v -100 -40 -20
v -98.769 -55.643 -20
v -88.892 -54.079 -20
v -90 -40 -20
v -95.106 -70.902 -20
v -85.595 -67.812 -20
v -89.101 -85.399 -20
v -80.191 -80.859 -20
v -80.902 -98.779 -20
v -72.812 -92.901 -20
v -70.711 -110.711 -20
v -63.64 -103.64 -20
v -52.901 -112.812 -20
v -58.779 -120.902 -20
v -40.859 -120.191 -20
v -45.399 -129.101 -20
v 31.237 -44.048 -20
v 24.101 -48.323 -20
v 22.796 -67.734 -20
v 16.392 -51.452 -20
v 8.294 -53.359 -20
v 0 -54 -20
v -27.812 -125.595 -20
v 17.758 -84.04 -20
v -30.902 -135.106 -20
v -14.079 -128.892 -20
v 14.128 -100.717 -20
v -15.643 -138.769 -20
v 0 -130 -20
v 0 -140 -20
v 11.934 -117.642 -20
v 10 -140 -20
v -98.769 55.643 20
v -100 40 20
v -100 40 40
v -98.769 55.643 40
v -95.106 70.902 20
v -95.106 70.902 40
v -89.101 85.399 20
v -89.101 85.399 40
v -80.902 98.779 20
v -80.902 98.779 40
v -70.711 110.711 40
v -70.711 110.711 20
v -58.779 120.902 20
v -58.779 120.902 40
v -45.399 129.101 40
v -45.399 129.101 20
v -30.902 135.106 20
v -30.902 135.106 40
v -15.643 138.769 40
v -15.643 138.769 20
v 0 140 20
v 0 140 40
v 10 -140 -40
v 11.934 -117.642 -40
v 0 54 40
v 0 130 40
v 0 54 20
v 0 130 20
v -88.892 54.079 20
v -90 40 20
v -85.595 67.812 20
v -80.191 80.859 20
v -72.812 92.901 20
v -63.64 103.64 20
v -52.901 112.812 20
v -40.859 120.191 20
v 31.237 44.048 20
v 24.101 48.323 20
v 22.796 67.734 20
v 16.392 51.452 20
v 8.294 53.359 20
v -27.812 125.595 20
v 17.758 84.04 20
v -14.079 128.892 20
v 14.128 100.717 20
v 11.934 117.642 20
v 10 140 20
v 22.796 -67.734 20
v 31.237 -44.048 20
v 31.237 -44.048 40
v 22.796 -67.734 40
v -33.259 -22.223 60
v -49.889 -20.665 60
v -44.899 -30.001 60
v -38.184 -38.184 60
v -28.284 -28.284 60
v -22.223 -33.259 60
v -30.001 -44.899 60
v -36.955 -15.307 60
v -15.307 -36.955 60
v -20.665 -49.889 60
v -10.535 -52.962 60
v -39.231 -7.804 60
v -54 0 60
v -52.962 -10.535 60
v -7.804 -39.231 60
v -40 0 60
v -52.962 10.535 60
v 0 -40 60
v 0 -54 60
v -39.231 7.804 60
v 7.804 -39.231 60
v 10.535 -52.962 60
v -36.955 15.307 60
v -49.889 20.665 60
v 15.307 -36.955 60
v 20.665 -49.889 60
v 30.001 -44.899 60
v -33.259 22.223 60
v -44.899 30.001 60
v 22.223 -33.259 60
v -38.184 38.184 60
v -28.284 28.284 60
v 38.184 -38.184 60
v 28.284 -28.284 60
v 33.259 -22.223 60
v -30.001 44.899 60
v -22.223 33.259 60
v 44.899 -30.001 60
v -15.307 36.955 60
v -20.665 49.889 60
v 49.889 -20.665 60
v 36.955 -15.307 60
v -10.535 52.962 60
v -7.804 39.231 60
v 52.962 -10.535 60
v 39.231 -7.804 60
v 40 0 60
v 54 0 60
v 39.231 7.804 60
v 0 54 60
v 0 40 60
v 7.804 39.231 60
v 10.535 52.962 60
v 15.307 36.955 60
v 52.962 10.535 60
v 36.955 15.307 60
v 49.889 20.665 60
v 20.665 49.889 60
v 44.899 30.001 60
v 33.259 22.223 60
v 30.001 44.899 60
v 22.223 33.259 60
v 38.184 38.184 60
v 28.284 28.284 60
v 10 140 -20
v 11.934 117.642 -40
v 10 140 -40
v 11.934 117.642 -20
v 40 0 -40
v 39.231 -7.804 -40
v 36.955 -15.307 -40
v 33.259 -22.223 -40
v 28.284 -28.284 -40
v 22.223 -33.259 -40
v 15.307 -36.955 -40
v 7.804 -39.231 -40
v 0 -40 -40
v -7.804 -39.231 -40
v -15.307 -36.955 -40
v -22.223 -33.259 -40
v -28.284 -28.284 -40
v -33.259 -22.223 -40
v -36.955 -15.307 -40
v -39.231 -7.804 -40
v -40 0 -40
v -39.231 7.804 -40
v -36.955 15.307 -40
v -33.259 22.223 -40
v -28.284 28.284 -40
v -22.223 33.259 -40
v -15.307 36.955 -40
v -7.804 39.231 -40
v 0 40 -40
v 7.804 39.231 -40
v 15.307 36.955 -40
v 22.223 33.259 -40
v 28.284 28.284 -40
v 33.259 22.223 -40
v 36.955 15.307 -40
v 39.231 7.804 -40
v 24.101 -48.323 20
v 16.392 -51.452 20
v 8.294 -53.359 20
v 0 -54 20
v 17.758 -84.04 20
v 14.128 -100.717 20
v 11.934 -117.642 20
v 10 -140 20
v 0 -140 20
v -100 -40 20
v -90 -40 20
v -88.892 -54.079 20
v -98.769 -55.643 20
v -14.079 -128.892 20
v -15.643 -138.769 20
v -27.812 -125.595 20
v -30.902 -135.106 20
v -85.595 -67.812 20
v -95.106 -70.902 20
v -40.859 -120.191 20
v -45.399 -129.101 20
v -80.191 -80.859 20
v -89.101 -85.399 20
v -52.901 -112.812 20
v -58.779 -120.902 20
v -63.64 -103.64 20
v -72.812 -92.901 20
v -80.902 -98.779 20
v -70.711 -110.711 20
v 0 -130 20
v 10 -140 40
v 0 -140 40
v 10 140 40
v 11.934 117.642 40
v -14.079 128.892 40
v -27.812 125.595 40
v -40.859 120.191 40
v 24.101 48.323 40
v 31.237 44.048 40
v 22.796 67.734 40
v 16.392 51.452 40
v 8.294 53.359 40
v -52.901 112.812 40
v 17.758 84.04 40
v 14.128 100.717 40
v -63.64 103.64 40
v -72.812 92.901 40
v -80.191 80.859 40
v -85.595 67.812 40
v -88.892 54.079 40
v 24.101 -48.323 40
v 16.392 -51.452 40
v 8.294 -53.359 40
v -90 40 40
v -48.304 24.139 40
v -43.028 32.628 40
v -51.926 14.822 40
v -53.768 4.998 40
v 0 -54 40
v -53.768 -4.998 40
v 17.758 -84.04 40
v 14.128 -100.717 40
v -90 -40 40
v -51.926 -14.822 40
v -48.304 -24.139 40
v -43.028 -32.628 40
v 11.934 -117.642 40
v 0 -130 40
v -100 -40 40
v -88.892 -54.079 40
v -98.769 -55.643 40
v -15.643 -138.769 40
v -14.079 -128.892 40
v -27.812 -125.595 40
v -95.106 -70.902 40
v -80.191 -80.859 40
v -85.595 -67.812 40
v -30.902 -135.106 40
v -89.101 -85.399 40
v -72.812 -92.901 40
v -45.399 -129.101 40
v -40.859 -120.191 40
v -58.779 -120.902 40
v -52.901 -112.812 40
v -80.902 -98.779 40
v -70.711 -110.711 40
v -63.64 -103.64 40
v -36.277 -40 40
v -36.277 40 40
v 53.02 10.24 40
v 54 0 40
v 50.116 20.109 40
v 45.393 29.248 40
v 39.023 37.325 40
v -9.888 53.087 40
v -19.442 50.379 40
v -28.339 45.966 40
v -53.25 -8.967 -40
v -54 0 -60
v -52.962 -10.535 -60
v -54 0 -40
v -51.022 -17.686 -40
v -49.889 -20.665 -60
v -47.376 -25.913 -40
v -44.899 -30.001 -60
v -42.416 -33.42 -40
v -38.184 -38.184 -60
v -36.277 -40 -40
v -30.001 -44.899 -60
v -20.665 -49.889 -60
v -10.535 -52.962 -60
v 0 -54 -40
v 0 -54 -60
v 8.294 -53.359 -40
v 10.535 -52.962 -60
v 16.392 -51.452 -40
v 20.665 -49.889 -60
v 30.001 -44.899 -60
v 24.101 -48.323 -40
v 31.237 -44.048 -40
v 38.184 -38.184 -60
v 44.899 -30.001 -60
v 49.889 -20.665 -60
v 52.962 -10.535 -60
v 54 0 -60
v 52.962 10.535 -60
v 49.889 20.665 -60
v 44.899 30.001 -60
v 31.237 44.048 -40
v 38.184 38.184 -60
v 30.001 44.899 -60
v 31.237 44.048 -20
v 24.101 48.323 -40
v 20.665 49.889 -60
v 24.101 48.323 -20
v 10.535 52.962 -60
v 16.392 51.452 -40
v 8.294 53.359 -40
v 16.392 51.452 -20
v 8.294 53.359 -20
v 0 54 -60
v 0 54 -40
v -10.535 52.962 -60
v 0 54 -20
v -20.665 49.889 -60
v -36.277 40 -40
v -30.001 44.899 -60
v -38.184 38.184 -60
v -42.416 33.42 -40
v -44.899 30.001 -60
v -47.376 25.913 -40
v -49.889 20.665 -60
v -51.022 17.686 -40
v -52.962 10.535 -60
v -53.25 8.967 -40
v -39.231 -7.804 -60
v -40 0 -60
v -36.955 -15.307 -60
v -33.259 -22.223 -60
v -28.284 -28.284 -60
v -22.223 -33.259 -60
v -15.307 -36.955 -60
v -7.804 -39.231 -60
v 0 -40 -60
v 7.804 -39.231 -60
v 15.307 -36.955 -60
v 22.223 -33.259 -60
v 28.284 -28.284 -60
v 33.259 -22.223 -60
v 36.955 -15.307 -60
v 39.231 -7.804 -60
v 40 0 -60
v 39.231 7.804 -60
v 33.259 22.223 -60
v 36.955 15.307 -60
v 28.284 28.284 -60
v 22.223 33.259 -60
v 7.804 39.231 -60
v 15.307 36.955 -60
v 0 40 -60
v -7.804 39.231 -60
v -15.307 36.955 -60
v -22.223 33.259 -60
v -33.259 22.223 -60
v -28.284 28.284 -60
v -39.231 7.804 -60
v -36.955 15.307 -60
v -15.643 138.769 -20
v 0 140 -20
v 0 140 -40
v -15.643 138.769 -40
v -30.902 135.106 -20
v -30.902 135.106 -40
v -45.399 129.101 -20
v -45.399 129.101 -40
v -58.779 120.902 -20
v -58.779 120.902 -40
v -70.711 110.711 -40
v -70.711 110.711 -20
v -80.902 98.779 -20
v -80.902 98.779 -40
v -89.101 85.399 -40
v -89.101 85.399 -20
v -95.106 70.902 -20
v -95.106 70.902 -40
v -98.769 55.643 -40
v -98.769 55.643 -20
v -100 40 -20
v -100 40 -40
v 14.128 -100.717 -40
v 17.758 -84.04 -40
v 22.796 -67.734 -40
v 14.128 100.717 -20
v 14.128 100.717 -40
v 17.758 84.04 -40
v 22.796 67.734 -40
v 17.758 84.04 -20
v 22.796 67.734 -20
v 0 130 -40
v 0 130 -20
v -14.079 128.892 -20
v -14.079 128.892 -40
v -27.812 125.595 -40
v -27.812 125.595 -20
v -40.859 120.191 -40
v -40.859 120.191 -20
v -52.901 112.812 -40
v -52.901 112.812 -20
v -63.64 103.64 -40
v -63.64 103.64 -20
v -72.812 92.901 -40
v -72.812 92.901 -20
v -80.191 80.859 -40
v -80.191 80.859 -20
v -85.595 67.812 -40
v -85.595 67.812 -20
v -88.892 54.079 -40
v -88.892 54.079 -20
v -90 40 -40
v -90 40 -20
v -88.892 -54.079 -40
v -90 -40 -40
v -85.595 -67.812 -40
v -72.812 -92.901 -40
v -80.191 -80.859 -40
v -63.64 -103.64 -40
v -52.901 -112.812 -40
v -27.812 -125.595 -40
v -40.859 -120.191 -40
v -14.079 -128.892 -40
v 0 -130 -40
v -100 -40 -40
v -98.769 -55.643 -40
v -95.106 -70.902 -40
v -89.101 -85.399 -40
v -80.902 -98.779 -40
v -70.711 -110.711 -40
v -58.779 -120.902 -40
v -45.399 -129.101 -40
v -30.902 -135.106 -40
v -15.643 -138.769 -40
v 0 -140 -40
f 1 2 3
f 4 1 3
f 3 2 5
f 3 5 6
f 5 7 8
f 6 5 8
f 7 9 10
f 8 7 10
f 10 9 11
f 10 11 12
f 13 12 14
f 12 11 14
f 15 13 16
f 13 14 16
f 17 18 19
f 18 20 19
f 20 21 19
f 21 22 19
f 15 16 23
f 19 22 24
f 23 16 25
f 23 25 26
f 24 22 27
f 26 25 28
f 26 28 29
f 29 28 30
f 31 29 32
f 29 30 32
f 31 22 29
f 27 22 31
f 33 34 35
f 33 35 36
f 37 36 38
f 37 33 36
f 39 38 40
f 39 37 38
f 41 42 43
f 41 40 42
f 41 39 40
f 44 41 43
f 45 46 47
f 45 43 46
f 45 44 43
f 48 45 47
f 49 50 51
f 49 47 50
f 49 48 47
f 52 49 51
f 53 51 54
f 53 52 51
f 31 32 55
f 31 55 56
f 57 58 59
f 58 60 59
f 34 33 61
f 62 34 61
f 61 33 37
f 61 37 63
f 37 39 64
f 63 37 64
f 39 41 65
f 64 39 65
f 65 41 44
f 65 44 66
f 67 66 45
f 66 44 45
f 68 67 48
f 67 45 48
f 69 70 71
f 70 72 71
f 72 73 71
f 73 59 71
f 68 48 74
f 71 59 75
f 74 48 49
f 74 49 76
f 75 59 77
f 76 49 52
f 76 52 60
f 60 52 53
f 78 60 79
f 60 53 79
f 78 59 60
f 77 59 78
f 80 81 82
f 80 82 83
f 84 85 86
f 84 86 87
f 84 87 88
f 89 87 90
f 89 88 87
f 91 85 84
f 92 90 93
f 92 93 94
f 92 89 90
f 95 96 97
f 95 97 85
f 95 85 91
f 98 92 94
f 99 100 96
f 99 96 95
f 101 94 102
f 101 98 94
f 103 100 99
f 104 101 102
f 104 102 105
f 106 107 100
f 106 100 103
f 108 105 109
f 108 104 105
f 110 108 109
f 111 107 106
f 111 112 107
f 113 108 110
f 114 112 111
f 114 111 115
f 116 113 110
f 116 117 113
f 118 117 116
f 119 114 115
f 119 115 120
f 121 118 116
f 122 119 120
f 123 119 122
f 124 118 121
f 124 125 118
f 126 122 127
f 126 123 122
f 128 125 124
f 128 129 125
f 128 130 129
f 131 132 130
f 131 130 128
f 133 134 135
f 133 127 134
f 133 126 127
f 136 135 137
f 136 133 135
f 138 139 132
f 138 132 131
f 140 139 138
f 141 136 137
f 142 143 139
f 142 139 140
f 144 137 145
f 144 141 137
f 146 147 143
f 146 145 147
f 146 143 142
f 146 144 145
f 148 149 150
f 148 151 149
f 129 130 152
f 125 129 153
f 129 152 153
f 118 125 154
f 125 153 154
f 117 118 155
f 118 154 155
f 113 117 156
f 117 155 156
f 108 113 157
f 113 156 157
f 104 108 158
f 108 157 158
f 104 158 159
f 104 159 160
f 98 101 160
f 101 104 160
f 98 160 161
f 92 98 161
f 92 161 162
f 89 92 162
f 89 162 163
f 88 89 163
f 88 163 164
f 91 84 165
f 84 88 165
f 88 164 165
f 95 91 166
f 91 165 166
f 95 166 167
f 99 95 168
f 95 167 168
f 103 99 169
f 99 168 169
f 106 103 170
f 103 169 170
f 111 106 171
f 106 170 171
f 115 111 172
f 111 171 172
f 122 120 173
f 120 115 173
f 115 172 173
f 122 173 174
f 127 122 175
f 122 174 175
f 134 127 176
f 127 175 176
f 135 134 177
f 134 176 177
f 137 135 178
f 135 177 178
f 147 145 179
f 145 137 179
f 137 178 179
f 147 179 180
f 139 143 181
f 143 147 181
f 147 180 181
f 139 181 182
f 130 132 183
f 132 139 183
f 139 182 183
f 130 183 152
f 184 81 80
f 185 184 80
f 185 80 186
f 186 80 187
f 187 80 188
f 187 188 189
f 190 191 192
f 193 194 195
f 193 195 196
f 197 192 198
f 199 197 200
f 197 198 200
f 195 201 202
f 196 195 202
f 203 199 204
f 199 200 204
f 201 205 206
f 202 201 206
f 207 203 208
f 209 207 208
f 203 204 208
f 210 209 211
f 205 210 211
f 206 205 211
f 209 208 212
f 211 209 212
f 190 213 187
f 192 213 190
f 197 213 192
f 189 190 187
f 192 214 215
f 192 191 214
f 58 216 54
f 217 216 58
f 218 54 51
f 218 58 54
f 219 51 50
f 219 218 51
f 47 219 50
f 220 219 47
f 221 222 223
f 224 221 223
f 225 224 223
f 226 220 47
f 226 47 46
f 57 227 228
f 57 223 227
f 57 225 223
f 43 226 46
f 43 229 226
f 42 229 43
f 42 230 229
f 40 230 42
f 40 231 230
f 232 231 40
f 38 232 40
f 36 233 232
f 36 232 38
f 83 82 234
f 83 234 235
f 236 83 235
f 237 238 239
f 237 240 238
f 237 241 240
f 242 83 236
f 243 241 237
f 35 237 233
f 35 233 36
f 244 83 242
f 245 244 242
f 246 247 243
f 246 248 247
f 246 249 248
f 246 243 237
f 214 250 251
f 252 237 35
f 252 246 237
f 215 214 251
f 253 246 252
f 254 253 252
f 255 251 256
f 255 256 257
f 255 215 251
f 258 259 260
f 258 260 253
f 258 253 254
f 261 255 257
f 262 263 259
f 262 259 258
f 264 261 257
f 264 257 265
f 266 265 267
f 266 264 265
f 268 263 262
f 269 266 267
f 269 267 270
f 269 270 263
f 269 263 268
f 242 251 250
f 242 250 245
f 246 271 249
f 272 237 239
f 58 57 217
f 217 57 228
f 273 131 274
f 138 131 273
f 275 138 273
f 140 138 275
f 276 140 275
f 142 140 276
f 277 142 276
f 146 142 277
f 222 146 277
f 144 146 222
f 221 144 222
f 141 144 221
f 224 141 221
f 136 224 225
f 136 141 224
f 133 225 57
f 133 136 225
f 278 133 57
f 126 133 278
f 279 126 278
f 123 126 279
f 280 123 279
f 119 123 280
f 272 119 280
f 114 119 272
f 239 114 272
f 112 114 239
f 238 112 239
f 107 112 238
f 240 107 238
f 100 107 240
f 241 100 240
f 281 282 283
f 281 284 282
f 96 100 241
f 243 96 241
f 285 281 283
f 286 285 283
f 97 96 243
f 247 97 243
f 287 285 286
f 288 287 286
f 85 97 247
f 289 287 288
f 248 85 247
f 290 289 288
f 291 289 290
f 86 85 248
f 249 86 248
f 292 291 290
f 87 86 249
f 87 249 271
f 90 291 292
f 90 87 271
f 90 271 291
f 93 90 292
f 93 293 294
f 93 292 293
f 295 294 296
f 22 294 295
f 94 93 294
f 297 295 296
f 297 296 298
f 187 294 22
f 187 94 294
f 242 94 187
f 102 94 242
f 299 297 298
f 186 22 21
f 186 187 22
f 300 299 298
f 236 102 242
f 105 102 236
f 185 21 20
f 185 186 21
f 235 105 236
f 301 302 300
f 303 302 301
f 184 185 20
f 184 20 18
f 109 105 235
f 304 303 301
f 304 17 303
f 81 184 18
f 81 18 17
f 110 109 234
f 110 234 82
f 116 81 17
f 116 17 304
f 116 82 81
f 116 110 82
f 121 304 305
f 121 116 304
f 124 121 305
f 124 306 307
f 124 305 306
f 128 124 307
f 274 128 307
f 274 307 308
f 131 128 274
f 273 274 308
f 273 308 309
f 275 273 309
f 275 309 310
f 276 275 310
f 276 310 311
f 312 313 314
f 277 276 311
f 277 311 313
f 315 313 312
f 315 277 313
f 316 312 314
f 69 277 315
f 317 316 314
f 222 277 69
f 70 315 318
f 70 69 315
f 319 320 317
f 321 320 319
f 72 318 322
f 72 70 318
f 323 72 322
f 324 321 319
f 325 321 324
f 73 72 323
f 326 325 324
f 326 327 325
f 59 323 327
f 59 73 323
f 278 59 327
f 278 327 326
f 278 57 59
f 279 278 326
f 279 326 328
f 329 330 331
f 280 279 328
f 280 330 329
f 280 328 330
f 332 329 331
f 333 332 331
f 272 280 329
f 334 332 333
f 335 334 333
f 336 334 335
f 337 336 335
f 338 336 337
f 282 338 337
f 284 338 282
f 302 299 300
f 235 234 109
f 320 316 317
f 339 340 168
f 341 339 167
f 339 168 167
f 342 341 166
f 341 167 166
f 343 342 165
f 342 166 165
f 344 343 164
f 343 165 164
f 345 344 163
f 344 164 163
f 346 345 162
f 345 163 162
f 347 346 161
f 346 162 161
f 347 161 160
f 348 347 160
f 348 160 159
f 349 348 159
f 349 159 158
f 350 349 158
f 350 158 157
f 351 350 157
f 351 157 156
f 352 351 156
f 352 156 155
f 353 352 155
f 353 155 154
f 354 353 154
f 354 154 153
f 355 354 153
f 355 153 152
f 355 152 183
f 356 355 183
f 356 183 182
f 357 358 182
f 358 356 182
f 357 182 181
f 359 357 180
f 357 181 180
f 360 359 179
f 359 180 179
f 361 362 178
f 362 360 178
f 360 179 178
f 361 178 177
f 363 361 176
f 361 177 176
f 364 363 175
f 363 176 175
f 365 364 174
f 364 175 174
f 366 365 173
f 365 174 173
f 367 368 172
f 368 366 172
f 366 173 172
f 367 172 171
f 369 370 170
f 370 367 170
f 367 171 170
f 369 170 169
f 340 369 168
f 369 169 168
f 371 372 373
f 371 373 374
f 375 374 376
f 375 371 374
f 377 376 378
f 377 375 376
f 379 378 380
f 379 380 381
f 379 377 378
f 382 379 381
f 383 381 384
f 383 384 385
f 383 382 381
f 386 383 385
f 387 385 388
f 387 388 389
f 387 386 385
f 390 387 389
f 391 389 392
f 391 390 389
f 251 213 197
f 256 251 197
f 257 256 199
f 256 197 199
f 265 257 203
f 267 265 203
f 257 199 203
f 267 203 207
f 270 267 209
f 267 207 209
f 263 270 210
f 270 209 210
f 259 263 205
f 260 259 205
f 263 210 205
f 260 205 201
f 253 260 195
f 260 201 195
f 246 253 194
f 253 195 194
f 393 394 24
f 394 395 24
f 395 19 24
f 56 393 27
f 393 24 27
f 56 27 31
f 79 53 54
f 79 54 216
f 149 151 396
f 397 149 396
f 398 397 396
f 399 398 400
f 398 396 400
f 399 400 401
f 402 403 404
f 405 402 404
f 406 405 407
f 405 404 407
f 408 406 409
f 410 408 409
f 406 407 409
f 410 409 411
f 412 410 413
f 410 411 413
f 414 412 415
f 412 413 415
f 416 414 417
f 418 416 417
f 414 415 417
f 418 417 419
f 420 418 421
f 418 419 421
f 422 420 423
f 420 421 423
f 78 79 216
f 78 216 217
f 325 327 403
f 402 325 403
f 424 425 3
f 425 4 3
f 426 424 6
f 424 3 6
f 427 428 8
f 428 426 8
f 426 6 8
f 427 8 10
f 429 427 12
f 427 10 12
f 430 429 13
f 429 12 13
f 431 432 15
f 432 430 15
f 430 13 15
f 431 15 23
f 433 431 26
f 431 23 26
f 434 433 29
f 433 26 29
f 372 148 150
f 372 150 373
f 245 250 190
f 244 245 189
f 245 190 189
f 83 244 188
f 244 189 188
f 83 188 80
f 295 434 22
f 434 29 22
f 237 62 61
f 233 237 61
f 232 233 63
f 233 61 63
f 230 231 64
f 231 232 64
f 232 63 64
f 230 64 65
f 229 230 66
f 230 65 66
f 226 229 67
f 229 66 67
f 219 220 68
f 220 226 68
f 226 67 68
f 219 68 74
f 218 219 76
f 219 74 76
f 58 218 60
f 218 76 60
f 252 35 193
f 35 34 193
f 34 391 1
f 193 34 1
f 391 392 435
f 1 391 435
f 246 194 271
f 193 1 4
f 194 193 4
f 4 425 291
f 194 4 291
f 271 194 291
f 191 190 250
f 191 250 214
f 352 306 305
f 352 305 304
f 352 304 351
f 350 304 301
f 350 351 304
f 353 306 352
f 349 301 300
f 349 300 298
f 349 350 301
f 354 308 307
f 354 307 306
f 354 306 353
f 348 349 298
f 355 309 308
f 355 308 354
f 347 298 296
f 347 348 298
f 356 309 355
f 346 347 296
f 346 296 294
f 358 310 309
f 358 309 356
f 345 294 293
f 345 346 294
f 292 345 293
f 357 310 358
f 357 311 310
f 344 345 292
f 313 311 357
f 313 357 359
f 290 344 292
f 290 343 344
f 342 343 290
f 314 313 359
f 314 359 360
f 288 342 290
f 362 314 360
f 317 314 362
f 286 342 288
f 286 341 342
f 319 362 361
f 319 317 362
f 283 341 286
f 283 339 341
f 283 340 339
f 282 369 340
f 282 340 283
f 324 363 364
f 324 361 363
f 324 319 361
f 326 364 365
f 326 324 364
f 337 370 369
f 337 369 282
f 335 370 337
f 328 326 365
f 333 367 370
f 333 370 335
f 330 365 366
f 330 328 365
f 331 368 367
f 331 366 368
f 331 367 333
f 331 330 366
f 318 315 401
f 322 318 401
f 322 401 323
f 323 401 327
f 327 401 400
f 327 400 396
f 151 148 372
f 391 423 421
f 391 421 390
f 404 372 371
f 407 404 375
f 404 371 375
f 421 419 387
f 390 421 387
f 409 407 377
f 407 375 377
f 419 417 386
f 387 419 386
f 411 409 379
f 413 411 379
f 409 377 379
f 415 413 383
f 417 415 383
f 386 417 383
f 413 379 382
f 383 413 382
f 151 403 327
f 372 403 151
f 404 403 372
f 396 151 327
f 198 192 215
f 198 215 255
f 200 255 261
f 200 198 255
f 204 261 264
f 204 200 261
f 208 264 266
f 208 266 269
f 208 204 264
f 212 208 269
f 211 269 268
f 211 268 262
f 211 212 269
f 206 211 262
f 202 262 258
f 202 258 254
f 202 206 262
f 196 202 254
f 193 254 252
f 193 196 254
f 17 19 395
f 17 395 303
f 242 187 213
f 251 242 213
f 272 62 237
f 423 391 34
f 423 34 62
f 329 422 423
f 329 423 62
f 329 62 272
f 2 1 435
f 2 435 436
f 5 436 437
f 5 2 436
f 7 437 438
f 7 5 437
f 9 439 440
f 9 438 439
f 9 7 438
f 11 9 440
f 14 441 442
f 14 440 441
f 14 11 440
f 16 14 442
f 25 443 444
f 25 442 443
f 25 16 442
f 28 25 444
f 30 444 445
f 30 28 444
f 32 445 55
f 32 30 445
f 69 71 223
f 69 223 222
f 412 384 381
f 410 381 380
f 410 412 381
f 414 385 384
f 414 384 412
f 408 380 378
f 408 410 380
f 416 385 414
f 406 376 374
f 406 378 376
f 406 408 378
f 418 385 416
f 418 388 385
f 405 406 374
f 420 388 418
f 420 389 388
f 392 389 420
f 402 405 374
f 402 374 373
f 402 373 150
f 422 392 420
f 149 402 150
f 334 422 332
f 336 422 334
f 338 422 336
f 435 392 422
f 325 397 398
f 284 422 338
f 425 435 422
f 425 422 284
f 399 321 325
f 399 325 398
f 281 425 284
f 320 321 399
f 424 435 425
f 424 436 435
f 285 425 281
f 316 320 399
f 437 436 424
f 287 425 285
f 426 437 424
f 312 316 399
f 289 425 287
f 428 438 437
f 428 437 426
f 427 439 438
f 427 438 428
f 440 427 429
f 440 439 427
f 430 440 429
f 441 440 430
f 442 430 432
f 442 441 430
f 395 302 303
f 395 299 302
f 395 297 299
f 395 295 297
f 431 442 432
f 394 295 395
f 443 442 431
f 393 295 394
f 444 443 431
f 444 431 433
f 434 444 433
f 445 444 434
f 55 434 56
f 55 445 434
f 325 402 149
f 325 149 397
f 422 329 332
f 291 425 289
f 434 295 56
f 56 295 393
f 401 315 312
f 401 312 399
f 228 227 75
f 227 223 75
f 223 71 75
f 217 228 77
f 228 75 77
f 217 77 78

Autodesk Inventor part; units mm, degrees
ref_plane "YZ Plane" through (0, 0, 0) normal (1, 0, 0) x (0, 1, 0)
ref_plane "XZ Plane" through (0, 0, 0) normal (0, 1, 0) x (-1, 0, 0)
sketch "Sketch1" plane through (0, 0, 0) normal (0, 0, 1) x (1, 0, 0)
  circle A0 centre (0, 0) radius 20
  circle A1 centre (0, 0) radius 27
  line L0 (-27, 0) -> (-50, 0) construction
  line L1 (-50, 20) -> (-50, -20)
  line L2 (-50, 20) -> (-18.1384, 20)
  line L3 (-50, -20) -> (-18.1384, -20)
  dimension "d0" = 40
  dimension "d1" = 54
  dimension "d2" = 23
  dimension "d3" = 50
  dimension "d4" = 40
  dimension "d5" = 20
  dimension "d6" = 20
sketch "Sketch2" plane through (0, 0, 0) normal (0, 0, 1) x (1, 0, 0)
  point P0 (0, 0)
sketch "Sketch3" plane through (0, 0, 0) normal (0, 0, 1) x (1, 0, 0)
  point P0 (0, 0)
extrude "Extrusion1" add sketch "Sketch1" along normal mid plane 40
sketch "Sketch4" plane through (0, 0, 20) normal (0, 0, 1) x (1, 0, 0)
  circle A0 centre (0, 0) radius 20
  circle A1 centre (0, 0) radius 27
  dimension "d9" = 40
  dimension "d10" = 54
extrude "Extrusion2" add sketch "Sketch4" along normal blind 10
sketch "Sketch5" plane through (0, 0, -20) normal (0, 0, -1) x (-1, 0, 0)
  circle A0 centre (0, 0) radius 20
  circle A1 centre (0, 0) radius 27
  dimension "d13" = 40
  dimension "d14" = 54
extrude "Extrusion3" add sketch "Sketch5" along normal blind 10
sketch "Sketch6" plane through (0, 0, 0) normal (0, 0, 1) x (1, 0, 0)
  point P0 (0, 0)
ref_plane "Work Plane1" through (0, 0, 10) normal (0, 0, 1) x (1, 0, 0)
sketch "Sketch7" plane through (0, 0, 10) normal (0, 0, 1) x (1, 0, 0)
  circle A0 centre (0, 0) radius 20 projected
  line L0 (-50, 20) -> (-18.1384, 20) projected
  arc A1 (0, 70) -> (-50, 20) centre (0, 20) ccw
  arc A2 (0, 65) -> (-45, 20) centre (0, 20) ccw
  line L1 (0, 65) -> (0, 27)
  circle A3 centre (0, 0) radius 27 projected
  line L2 (0, 70) -> (5, 70)
  line L3 (5, 70) -> (5.9668, 58.8209)
  line L4 (11.398, 33.8671) -> (15.6186, 22.0241)
  arc A4 (5.9668, 58.8209) -> (11.398, 33.8671) centre (105.5949, 67.4369) ccw
  point P0 (7.7299, 38.4334)
  point P1 (5, 51.8198)
  dimension "d18" = 50
  dimension "d19" = 45
  dimension "d20" = 38
  dimension "d21" = 5
  dimension "d22" = 5
  dimension "d23" = 31.5666
  dimension "d24" = 94.943
  dimension "d25" = 29.7957
  dimension "d26" = 165.328
  dimension "d27" = 22.1057
  dimension "d28" = 100
extrude "Extrusion4" add sketch "Sketch7" along normal blind 10 contours A1 L2 L3 A4 L4 A3 L1 A2 L0
mirror "Mirror1" about plane through (0, 0, 0) normal (0, 0, 1) of "Extrusion4"
mirror "Mirror2" about plane through (0, 0, 0) normal (0, 1, 0) of "Extrusion4", "Mirror1"
scale "Scale1" factors (2, 2, 2) then translate (0, 0, 0) bodies 1
properties part number "project part" material "Aluminum 6061"
